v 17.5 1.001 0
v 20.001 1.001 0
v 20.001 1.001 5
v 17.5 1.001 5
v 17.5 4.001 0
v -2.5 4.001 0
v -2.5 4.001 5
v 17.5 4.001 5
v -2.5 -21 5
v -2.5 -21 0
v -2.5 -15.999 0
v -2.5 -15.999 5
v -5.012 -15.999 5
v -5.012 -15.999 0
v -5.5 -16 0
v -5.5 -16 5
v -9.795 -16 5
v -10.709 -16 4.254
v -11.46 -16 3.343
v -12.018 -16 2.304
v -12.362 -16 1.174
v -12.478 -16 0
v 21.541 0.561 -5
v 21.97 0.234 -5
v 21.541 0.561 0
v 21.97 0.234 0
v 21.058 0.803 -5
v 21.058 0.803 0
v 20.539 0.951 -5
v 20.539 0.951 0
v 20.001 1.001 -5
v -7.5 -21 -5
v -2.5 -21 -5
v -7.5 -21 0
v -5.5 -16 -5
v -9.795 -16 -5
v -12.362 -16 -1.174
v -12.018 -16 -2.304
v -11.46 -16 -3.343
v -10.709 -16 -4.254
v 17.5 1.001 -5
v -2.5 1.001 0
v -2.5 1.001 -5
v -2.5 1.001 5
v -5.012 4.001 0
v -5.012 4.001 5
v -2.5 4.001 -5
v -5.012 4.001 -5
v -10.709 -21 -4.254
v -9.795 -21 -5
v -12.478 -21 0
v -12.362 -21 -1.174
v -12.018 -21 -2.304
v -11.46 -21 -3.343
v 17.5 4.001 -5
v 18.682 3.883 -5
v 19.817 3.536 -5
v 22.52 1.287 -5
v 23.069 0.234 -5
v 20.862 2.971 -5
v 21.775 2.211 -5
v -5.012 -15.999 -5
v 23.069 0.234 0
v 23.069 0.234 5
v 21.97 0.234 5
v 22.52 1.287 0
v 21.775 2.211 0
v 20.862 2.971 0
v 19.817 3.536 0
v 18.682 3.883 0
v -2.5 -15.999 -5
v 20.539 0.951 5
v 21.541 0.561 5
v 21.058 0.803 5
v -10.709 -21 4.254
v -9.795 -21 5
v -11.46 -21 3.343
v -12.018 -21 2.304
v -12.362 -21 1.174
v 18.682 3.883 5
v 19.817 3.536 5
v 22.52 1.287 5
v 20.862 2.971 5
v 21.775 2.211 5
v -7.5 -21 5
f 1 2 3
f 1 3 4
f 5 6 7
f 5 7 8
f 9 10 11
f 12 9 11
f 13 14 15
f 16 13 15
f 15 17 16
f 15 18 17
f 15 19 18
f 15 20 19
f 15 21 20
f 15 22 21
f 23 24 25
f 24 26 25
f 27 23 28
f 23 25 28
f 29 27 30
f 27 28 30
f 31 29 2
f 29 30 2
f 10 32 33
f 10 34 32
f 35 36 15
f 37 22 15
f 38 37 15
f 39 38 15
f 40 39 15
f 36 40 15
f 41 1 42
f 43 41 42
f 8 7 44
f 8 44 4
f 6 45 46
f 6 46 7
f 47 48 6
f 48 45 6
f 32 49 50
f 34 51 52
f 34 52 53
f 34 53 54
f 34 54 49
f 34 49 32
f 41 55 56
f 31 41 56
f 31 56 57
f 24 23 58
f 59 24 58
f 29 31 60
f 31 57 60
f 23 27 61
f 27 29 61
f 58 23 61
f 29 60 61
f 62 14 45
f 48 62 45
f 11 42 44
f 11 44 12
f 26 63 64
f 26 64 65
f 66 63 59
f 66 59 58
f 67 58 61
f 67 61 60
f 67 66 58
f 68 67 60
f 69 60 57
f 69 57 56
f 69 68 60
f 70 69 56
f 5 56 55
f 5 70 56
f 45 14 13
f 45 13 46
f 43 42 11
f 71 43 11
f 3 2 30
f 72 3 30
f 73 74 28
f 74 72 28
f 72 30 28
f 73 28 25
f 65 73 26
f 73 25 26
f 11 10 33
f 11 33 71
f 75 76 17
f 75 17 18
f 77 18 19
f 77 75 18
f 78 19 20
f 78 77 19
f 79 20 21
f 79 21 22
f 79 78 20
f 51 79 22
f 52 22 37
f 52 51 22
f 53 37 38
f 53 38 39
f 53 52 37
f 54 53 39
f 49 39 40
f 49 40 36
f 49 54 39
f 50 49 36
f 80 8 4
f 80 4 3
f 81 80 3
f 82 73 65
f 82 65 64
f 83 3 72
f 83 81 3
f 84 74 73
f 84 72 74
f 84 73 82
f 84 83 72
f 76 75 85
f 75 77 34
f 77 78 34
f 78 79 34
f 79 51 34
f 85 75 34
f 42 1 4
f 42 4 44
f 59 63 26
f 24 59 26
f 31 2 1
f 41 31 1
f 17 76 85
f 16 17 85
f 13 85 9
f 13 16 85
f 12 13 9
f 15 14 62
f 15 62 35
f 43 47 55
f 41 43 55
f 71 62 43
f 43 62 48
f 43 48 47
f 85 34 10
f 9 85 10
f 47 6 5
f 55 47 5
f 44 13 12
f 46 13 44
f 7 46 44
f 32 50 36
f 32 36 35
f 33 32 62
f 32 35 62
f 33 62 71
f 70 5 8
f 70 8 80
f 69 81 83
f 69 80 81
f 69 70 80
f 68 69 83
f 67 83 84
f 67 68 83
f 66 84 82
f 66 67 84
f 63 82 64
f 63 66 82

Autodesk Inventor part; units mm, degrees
ref_plane "YZ Plane" through (0, 0, 0) normal (1, 0, 0) x (0, 1, 0)
ref_plane "XZ Plane" through (0, 0, 0) normal (0, 1, 0) x (-1, 0, 0)
ref_plane "XY Plane" through (0, 0, 0) normal (0, 0, 1) x (1, 0, 0)
sketch "Sketch2" plane through (0, 0, 0) normal (0, 0, 1) x (1, 0, 0)
  line L0 (-17.5, -21) -> (-7.5, -21) projected
  line L1 (-91.1, -16) -> (-5.5, -16) projected
  line L2 (-5.5, -16) -> (-5.5, 28.3) projected
  line L3 (-12.5, -21) -> (-12.5, -16)
  line L4 (-12.5, -21) -> (-2.5, -21)
  line L5 (-2.5, -21) -> (-2.5, -15.999)
  line L6 (-2.5, -15.999) -> (-12.5, -15.999)
  line L7 (-12.5, -15.999) -> (-12.5, -21)
  line L8 (-2.5, -15.999) -> (-5.0122, -15.999)
  line L9 (-5.0122, -15.999) -> (-5.0122, 4.001)
  line L10 (-5.0122, 4.001) -> (-2.5, 4.001)
  line L11 (-2.5, 4.001) -> (-2.5, -15.999)
  line L12 (-2.5, 4.001) -> (17.5, 4.001)
  line L13 (17.5, 4.001) -> (17.5, 1.001)
  line L14 (17.5, 1.001) -> (-2.5, 1.001)
  line L15 (-2.5, 1.001) -> (-2.5, 4.001)
  arc A0 (23.0689, 0.2342) -> (17.5, 4.001) centre (17.5, -1.999) ccw
  arc A1 (21.9703, 0.2342) -> (20.0013, 1.001) centre (20.0013, -1.9105) ccw
  line L16 (20.0013, 1.001) -> (17.5, 1.001)
  line L17 (23.0689, 0.2342) -> (21.9703, 0.2342)
  point P0 (0, 0)
  point P1 (-5.5, -15.999)
  dimension "d0" = 10
  dimension "d1" = 20
  dimension "d2" = 20
  dimension "d3" = 3
  dimension "d9" = 6
extrude "Extrusion1" add sketch "Sketch2" against normal mid plane 10
sketch "Sketch3" plane through (-12.5, -21, -5) normal (0, -1, 0) x (1, 0, 0)
  line L0 (5, 0) -> (5, -5) projected
  line L1 (0, 0) -> (7.4878, 0) projected
  arc A0 (2.7054, 10) -> (2.7054, 0) centre (6.0221, 5) ccw
  line L2 (2.7054, 0) -> (-2.2946, 0)
  line L3 (0, 0) -> (0, 10) projected
  line L4 (-2.2946, 10) -> (2.7054, 10)
  line L5 (-2.2946, 0) -> (-2.2946, 10)
  point P0 (12.5, 5)
  point P1 (2.7054, 0)
  dimension "d6" = 6
extrude "Extrusion2" cut sketch "Sketch3" against normal blind 10 contours L3 L4 A0 L1
properties part number "ЛЦМК000002.00.00.00.00.07"
